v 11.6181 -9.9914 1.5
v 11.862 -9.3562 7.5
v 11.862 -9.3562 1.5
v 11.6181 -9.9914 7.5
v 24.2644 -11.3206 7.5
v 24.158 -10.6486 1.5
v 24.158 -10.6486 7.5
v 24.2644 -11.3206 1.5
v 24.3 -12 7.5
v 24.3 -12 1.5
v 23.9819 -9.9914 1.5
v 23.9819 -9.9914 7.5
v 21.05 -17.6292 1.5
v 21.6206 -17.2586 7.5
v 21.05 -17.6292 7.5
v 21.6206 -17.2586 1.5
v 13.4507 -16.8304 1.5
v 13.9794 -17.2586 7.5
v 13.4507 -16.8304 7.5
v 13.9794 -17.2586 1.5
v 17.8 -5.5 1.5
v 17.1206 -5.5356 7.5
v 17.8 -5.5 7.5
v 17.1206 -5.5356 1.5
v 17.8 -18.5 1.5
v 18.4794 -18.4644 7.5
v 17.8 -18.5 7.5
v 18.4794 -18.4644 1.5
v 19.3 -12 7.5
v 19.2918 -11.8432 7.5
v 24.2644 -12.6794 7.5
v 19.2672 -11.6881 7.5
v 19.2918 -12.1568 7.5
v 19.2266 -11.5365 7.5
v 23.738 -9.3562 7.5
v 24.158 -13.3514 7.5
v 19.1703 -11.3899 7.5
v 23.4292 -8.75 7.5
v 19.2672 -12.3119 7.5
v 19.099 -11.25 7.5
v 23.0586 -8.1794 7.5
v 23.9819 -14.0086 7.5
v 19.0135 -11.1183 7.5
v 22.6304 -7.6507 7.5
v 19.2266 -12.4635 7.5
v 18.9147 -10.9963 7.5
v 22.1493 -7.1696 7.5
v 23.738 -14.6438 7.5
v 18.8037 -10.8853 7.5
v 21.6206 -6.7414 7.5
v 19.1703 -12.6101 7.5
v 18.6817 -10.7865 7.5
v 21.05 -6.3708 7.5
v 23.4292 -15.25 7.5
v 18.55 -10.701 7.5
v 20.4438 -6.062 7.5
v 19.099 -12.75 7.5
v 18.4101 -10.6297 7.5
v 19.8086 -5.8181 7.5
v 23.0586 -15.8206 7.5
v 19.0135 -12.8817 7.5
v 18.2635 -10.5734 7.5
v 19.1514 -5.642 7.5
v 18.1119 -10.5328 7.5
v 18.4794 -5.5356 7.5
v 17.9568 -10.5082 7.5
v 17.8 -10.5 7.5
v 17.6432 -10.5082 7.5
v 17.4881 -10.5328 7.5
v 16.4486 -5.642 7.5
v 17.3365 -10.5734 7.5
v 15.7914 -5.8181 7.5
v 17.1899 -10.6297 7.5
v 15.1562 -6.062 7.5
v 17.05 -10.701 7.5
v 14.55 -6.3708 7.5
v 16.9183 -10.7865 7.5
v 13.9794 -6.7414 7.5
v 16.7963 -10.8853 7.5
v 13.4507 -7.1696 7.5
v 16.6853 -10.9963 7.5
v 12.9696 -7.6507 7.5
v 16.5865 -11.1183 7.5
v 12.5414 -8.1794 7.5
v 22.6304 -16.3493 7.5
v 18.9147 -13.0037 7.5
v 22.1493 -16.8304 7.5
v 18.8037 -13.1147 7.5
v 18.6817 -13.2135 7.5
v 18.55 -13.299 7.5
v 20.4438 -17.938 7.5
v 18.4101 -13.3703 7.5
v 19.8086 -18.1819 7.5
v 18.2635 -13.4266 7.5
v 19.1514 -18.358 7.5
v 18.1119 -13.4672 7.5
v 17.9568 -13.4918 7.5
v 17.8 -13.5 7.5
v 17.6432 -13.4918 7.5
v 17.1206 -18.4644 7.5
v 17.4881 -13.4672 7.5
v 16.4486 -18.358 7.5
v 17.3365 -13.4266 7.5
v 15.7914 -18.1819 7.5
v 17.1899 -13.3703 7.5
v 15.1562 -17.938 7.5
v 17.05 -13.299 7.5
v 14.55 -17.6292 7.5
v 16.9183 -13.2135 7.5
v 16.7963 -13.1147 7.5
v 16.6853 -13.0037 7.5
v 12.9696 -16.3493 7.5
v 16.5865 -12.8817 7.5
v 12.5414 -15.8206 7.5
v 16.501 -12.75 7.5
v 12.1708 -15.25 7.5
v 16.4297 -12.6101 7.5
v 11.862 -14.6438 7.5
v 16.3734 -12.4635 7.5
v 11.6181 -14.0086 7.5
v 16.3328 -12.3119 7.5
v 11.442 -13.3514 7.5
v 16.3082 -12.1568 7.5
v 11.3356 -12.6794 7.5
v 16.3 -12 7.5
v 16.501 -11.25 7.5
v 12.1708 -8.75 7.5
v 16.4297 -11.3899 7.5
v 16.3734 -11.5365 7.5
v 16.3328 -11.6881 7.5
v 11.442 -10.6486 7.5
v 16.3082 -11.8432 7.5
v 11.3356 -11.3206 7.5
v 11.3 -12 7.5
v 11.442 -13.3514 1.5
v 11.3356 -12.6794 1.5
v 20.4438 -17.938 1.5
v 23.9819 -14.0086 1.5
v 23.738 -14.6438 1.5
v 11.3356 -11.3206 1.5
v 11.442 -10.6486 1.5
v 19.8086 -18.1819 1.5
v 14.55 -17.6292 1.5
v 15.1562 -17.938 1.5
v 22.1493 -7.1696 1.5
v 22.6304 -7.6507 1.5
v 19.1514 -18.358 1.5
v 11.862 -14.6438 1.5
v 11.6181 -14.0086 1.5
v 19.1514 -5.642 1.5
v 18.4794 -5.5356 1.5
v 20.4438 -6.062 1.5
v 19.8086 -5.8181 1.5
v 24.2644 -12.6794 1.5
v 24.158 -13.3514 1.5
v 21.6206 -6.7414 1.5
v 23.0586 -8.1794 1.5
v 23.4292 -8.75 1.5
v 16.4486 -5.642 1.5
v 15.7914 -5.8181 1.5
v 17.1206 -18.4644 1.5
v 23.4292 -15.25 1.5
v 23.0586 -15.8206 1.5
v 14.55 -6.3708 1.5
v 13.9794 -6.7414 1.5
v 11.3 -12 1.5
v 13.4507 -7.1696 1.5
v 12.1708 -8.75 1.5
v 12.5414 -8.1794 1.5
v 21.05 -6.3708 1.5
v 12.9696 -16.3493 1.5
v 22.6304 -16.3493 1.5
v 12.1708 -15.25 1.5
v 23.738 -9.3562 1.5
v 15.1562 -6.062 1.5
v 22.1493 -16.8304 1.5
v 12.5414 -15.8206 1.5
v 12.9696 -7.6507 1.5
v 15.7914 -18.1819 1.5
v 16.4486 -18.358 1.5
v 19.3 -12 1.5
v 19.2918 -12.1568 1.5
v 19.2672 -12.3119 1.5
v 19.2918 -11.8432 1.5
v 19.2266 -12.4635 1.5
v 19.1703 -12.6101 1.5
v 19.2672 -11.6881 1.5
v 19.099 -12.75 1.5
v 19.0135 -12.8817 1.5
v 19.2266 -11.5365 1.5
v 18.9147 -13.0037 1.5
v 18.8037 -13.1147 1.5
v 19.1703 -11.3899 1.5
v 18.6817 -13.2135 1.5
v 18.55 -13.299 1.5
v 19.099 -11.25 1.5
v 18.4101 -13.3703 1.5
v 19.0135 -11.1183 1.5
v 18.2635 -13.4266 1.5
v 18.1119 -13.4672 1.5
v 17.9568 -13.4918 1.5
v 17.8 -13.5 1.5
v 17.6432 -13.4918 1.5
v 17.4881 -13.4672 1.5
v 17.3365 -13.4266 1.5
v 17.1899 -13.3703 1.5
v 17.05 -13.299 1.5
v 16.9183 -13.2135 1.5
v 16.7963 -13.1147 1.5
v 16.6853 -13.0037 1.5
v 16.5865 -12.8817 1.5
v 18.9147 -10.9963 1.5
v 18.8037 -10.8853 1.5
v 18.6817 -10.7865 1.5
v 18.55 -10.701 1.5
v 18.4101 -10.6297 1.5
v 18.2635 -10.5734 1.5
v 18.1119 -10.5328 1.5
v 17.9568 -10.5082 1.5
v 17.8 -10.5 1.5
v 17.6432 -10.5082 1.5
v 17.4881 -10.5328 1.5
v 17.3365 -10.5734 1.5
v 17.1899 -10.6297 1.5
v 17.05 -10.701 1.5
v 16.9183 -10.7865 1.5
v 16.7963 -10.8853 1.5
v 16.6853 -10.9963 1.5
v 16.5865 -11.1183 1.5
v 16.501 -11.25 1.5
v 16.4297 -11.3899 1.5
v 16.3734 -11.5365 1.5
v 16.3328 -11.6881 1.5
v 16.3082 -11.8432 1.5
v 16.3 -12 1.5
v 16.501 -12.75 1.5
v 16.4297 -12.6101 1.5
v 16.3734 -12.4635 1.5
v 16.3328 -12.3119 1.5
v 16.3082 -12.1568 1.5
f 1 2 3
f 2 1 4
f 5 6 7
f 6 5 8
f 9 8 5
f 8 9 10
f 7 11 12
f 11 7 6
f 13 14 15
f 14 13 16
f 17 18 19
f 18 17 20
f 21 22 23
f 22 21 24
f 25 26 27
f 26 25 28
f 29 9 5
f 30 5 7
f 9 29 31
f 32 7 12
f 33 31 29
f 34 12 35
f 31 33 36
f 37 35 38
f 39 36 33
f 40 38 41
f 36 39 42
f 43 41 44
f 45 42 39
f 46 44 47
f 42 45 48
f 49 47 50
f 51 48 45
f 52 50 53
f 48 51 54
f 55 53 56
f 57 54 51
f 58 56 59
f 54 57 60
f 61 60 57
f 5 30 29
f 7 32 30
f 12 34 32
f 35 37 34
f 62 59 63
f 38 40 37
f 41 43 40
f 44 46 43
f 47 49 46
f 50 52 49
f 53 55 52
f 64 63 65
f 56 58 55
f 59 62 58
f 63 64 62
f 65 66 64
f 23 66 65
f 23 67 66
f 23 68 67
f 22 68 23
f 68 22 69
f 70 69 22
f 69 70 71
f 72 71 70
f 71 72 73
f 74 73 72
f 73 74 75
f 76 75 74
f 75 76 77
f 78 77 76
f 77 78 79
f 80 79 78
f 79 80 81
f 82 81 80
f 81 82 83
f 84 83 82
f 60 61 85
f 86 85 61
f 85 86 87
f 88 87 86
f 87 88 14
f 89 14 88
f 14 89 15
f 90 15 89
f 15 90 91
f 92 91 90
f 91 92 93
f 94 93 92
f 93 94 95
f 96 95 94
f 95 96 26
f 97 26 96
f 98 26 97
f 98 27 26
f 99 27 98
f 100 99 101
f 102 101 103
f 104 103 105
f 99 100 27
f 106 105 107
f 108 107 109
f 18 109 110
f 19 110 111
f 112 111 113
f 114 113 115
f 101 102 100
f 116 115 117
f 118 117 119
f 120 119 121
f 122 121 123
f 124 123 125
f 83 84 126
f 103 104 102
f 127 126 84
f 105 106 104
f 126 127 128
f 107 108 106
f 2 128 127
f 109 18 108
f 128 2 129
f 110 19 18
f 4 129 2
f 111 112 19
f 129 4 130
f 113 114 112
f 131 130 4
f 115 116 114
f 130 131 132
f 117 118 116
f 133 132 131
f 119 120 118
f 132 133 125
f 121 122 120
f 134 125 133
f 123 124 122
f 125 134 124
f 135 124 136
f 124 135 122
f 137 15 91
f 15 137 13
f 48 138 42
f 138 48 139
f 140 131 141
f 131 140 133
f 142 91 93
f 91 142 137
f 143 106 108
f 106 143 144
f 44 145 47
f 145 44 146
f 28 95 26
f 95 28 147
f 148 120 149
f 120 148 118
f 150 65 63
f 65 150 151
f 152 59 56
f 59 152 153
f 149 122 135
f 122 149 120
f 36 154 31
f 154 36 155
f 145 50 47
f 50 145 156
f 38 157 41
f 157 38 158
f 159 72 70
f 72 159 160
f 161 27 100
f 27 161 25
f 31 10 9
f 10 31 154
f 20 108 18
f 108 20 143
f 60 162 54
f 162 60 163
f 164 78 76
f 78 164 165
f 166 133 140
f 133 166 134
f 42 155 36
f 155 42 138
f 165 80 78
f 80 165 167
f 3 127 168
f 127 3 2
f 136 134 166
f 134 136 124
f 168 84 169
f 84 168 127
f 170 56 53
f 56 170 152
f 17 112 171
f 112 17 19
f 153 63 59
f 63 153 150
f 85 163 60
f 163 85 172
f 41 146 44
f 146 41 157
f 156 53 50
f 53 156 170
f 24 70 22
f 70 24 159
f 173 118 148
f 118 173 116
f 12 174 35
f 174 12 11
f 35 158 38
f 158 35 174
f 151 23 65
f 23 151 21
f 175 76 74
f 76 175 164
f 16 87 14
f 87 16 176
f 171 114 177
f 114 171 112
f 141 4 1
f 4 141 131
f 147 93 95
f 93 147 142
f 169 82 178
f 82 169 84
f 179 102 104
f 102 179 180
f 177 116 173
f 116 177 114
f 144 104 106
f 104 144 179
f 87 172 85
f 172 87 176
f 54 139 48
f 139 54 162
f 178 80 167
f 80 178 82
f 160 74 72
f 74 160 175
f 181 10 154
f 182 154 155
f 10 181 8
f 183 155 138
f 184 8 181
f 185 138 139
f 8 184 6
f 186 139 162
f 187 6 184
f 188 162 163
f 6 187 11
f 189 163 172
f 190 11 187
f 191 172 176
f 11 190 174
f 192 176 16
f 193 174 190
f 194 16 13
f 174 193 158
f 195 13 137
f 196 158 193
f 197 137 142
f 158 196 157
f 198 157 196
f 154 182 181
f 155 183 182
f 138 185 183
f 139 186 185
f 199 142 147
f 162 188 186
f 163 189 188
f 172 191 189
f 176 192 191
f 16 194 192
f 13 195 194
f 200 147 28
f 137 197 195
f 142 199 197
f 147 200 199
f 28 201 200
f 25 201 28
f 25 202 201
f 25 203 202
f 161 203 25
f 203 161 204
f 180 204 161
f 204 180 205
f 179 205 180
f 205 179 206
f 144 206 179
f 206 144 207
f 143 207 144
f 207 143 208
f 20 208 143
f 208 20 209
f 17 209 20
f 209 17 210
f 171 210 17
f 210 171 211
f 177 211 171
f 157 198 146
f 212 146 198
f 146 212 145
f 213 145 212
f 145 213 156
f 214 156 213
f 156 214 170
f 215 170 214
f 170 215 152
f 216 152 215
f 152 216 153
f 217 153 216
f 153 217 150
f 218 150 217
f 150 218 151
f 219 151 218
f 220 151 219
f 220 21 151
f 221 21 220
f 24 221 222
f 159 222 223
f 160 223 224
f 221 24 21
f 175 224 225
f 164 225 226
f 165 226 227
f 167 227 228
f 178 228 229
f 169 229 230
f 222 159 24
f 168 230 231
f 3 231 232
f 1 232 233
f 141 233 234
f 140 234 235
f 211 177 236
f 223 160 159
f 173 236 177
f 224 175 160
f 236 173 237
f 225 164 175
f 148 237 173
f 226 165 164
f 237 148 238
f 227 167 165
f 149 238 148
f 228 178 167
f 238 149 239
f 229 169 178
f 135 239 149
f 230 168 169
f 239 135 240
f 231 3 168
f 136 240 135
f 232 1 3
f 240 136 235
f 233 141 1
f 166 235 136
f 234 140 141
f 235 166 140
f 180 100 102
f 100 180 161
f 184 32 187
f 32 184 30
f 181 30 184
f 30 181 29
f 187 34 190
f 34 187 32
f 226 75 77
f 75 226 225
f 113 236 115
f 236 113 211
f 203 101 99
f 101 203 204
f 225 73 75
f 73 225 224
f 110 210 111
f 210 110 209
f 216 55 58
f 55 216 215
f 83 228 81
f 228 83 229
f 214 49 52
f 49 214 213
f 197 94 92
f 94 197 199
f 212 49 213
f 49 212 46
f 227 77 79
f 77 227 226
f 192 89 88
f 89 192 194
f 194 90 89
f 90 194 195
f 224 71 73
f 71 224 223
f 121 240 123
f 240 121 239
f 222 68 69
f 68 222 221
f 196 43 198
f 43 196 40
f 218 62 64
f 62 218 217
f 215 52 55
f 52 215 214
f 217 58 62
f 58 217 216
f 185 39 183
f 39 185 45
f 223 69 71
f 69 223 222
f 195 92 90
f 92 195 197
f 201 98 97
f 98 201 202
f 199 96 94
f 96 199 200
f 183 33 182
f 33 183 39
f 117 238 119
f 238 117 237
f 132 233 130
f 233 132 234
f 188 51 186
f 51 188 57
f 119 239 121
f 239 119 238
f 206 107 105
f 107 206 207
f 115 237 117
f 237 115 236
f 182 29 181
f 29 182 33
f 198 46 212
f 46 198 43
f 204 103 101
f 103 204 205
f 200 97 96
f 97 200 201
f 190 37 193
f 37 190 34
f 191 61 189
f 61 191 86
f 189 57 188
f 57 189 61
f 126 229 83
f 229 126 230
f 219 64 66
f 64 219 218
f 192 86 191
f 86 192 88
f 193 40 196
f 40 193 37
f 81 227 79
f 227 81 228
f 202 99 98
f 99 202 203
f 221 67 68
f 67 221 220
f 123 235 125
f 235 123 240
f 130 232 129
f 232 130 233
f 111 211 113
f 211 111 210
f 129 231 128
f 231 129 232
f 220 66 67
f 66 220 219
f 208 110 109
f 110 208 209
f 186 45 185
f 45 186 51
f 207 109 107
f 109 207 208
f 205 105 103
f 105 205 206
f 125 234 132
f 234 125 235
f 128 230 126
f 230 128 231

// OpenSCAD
   color( "blue", 1.0 ) {
  translate(v = [17.8, -12, 1.5]) {
$fn=60;
      
      
difference() {
    
cylinder(h = 6, d = 13); //V1=7mm V2=6mm
  translate(v = [0, 0, -2]) { 
          cylinder(h = 10, d = 3);
  }
}
}
}
